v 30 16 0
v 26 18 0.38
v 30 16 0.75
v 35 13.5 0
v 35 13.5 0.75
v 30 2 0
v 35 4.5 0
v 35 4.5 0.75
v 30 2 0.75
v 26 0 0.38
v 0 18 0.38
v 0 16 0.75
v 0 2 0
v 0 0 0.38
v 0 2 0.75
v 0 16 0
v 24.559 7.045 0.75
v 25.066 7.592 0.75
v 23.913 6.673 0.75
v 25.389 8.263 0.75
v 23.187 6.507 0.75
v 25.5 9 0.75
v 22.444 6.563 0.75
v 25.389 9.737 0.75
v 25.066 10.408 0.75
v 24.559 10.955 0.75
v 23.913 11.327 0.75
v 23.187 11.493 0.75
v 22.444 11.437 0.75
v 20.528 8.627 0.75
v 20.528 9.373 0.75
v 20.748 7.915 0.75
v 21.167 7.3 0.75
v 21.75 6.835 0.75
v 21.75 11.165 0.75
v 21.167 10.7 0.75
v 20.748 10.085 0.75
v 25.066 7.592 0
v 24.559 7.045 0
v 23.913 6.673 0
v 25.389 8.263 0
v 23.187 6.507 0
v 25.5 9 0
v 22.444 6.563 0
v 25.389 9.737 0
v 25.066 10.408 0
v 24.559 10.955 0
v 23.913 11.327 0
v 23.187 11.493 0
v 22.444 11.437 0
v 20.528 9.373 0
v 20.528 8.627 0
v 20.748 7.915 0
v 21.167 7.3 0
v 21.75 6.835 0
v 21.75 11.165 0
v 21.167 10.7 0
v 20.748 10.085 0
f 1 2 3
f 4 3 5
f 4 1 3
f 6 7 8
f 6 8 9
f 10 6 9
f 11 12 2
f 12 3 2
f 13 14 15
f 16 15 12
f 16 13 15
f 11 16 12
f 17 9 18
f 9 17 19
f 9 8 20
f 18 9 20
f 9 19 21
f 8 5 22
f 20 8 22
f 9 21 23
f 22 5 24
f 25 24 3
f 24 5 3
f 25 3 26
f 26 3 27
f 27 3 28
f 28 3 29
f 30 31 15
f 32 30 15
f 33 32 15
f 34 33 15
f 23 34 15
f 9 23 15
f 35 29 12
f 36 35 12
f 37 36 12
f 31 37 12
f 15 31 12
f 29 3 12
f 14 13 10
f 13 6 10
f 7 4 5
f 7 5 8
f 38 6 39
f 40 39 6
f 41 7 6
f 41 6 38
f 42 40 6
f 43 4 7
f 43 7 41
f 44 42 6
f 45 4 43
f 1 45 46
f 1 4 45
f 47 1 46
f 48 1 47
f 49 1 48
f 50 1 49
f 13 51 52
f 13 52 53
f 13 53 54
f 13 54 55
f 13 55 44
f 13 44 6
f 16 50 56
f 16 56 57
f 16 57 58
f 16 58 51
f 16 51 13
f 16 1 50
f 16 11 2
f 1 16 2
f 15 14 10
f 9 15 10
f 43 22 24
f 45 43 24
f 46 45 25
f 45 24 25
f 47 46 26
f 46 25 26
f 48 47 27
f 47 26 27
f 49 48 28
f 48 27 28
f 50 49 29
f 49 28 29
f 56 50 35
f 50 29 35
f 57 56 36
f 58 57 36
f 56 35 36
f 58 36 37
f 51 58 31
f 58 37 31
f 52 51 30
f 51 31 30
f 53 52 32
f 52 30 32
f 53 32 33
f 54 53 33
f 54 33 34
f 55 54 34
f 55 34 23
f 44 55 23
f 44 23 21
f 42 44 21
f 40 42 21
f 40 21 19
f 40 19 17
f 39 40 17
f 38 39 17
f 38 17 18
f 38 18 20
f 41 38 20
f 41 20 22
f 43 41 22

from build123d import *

# Parameters (mm, degrees)
PAD_DEPTH       = 0.75
SKETCH001_R     = 2.5
POCKET_DEPTH    = 0.751
POCKET001_DEPTH = 35.001


with BuildPart() as part:
    # Sketch (on XY_Plane of Origin) → Pad (new body)
    with BuildSketch(Plane.XY):
        Polygon((0, 0), (0, 18), (26, 18), (35, 13.5), (35, 4.5), (26, 0), align=None)
    extrude(amount=PAD_DEPTH)

    # Sketch001 (on Face8 of Pad) → Pocket (cut, through all)
    with BuildSketch(Plane.XY.offset(0.75)):
        with Locations((23, 9)):
            Circle(SKETCH001_R)
    extrude(amount=-POCKET_DEPTH, mode=Mode.SUBTRACT)

    # Sketch002 (on Face1 of Pocket) → Pocket001 (cut, through all)
    with BuildSketch(Plane(origin=(0, 0, 0), x_dir=(0, -1, 0), z_dir=(-1, 0, 0))):
        Polygon((-2, 0), (0, 0.38), (-2, 0.75), (0, 0.75), (0, 0), align=None)
        Polygon((-16, 0.75), (-18, 0.38), (-16, 0), (-18, 0), (-18, 0.75), align=None)
    extrude(amount=-POCKET001_DEPTH, mode=Mode.SUBTRACT)


solid = part.part
